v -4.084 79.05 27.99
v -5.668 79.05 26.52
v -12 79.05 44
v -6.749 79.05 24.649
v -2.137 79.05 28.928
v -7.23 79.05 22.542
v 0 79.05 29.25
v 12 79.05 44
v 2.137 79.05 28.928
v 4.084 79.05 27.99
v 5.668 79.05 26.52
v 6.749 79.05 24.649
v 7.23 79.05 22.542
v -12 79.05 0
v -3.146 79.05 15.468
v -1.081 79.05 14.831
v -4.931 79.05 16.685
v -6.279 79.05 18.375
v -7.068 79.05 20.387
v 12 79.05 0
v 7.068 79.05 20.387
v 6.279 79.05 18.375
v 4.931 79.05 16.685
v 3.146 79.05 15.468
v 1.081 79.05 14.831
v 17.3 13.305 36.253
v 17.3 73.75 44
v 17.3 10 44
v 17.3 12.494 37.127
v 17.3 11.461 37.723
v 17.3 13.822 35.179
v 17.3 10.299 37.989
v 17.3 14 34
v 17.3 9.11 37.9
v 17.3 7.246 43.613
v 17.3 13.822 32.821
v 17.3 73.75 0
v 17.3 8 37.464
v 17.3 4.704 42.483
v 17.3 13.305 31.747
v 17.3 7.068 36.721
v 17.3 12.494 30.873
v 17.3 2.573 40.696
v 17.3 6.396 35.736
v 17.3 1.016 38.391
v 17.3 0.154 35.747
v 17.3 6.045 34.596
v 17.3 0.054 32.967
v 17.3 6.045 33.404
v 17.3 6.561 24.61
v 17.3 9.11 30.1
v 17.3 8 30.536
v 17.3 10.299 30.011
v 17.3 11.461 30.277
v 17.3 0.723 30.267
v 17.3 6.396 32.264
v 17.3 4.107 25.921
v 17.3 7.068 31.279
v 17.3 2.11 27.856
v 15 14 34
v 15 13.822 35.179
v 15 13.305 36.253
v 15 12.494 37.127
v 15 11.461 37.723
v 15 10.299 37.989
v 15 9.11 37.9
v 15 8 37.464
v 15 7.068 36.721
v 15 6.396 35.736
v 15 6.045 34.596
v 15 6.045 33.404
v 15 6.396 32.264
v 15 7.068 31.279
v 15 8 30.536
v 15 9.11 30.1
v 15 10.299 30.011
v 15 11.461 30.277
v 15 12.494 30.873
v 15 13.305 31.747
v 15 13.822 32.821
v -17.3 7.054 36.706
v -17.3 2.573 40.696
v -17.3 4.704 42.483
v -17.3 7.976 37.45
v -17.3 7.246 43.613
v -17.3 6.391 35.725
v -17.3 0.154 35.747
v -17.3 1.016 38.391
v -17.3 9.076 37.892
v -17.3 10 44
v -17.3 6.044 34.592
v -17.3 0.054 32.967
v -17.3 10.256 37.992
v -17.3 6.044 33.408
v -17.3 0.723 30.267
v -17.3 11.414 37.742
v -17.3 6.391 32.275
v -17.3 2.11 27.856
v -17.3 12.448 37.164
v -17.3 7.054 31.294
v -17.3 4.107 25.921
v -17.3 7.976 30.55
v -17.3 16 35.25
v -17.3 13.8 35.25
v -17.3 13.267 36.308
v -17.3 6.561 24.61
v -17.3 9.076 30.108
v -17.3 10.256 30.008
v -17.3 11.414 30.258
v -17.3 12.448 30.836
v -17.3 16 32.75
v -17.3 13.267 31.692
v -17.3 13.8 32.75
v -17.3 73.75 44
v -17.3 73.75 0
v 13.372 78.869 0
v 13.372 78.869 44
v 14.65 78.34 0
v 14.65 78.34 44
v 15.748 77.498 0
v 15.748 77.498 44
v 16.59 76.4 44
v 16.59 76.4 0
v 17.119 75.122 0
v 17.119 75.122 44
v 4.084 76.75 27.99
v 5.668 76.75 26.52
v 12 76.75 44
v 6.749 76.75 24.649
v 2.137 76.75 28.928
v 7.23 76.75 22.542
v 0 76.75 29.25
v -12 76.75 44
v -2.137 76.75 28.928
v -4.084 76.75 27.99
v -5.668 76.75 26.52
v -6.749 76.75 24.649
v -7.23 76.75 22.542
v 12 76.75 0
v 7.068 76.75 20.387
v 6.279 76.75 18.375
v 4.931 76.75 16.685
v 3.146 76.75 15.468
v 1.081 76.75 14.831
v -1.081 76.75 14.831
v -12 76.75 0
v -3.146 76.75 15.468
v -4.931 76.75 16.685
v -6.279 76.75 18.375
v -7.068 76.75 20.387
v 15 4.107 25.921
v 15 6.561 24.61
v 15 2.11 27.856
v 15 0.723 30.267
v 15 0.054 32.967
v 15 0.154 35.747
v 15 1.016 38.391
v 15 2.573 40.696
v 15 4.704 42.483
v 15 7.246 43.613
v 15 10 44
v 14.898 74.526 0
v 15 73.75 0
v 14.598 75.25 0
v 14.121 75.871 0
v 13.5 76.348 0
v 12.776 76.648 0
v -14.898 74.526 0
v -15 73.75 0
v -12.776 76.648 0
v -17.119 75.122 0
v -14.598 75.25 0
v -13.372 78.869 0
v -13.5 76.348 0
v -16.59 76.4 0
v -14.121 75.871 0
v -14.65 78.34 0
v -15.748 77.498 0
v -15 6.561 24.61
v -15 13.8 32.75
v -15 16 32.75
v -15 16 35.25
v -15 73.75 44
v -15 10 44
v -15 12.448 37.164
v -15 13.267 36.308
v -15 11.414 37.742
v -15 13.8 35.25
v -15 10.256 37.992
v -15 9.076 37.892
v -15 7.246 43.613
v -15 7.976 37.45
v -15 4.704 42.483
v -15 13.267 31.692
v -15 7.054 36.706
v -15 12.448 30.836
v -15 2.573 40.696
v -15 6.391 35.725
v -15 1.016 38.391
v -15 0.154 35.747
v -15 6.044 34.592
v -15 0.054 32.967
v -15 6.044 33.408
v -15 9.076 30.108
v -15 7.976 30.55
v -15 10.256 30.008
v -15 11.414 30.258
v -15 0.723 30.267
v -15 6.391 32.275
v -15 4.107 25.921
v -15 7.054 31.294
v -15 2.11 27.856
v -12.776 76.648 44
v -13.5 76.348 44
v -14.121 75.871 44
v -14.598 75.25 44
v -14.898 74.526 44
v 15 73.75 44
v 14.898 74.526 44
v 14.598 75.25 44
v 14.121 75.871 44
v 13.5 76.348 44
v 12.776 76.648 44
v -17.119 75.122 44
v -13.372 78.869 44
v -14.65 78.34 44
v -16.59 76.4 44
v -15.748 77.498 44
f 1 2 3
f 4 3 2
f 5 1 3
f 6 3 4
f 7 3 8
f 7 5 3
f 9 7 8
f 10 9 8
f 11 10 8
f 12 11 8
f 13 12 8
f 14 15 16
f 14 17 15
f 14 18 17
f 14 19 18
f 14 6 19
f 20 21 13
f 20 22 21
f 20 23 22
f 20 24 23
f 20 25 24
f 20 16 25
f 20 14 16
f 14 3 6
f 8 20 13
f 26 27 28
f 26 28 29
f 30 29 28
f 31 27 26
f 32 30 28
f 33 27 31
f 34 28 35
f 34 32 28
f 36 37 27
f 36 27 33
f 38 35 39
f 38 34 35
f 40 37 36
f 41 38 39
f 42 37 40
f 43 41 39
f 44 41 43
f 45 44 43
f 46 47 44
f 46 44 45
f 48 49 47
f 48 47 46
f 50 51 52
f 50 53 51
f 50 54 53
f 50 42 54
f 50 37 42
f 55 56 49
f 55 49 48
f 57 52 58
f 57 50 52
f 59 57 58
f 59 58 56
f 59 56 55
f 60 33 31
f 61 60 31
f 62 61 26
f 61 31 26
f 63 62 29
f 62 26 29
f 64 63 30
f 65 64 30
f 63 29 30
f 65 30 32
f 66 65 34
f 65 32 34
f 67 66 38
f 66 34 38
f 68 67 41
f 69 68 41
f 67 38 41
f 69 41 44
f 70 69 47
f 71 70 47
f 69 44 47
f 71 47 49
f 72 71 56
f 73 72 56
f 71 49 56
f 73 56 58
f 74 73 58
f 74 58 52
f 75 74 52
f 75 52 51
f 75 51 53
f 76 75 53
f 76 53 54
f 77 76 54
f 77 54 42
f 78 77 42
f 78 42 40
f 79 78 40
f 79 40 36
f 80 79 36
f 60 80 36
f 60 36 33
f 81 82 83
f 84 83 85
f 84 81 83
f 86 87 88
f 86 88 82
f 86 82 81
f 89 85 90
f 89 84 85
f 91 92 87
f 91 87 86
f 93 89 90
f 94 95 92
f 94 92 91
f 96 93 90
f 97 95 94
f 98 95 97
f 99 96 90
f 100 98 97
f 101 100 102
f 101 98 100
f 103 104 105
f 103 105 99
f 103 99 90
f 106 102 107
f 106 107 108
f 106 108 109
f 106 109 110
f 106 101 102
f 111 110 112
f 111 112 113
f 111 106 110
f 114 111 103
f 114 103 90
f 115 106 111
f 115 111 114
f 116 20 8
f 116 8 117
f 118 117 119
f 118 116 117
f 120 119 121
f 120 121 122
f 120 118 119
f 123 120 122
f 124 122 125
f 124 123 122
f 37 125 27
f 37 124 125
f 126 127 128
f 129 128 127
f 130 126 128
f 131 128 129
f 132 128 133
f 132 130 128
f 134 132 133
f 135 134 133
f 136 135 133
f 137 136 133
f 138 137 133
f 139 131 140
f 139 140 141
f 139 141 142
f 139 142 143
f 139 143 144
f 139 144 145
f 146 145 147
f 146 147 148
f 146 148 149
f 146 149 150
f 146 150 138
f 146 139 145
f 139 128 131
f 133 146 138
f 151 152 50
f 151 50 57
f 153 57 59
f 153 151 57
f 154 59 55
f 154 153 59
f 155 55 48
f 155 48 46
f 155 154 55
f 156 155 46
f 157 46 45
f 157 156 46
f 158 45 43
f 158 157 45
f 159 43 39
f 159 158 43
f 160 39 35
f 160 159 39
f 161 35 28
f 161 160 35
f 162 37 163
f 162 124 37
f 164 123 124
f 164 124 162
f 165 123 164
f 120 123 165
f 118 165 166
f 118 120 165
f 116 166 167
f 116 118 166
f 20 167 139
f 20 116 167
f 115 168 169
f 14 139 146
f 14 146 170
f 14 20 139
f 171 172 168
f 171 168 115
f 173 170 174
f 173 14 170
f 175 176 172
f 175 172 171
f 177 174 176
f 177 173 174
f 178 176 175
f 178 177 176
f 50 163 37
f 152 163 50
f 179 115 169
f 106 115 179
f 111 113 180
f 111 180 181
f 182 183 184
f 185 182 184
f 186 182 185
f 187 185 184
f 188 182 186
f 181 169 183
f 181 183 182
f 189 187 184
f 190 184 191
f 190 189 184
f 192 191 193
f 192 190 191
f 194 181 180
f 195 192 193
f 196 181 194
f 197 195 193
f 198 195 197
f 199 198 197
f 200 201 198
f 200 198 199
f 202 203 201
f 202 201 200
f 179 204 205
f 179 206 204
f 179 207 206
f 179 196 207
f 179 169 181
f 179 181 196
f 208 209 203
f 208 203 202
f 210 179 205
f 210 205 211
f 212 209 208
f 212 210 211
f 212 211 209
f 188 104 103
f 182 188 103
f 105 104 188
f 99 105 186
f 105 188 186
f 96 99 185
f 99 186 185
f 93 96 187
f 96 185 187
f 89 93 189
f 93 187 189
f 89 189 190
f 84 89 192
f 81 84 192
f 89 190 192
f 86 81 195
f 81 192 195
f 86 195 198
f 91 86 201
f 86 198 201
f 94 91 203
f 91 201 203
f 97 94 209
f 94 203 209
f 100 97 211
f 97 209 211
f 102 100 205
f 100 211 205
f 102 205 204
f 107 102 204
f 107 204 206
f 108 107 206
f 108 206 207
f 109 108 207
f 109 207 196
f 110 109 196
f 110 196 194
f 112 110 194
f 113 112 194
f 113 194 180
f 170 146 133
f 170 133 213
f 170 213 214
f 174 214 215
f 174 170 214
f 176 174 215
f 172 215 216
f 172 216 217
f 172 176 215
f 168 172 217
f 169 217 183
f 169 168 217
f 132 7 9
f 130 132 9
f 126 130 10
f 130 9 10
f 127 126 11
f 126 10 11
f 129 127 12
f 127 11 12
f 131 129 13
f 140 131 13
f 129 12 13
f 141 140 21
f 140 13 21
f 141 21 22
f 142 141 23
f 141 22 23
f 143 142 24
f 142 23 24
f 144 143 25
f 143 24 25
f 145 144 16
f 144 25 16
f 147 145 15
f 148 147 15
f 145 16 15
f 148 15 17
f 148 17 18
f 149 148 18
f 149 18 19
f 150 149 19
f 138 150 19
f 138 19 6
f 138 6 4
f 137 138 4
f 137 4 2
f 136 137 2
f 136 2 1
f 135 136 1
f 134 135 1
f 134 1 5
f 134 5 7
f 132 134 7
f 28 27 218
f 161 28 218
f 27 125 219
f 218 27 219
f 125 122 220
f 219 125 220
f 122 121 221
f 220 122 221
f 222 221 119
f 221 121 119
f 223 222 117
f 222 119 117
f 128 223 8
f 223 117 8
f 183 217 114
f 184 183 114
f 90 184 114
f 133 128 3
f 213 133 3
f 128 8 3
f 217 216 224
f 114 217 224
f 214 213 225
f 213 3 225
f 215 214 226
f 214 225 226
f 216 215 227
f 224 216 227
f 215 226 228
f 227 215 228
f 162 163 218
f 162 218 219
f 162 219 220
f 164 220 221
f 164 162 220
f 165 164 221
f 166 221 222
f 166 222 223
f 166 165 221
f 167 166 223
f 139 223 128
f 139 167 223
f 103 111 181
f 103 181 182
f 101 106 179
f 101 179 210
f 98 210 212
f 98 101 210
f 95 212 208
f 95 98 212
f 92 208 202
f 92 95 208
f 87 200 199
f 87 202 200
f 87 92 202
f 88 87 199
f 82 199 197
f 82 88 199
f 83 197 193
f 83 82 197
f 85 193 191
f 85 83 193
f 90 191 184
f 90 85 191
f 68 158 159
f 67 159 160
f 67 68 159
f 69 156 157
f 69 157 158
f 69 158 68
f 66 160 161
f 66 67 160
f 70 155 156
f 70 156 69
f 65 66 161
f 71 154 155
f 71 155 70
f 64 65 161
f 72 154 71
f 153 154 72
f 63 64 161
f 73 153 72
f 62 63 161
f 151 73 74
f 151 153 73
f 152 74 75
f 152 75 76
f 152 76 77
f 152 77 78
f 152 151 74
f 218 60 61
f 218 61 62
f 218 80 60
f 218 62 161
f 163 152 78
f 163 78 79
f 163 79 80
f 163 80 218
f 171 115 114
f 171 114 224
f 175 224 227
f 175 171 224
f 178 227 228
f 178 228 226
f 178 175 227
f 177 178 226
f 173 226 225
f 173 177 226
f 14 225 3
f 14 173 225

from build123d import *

# Parameters (mm, degrees)
BASE_FLANGE1_DEPTH      = 44
CUT_EXTRUDE1_DEPTH      = 57
CUT_EXTRUDE1_DEPTH_BACK = 42
SKETCH7_R               = 4
CUT_EXTRUDE2_DEPTH      = 42
SKETCH8_R               = 7.25
CUT_EXTRUDE3_DEPTH      = 42
SKETCH9_W               = 2.5
SKETCH9_H               = 6
CUT_EXTRUDE4_DEPTH      = 13


# Sheet-metal steps are written as plain solids
with BuildPart() as part:
    # Sketch1 → Base-Flange1 (new body)
    with BuildSketch(Plane.XY):
        with BuildLine():
            Line((15, 0), (15, 73.75))
            ThreePointArc((15, 73.75), (14.121320344, 75.871320344), (12, 76.75))
            Line((12, 76.75), (-12, 76.75))
            ThreePointArc((-12, 76.75), (-14.121320344, 75.871320344), (-15, 73.75))
            Line((-15, 73.75), (-15, 0))
            Line((-15, 0), (-17.3, 0))
            Line((-17.3, 0), (-17.3, 73.75))
            ThreePointArc((-17.3, 73.75), (-15.74766594, 77.49766594), (-12, 79.05))
            Line((-12, 79.05), (12, 79.05))
            ThreePointArc((12, 79.05), (15.74766594, 77.49766594), (17.3, 73.75))
            Line((17.3, 73.75), (17.3, 0))
            Line((17.3, 0), (15, 0))
        make_face()
    extrude(amount=BASE_FLANGE1_DEPTH)

    # Sketch6 → Cut-Extrude1 (cut, two sides: drawn at the far end of the back side and taken through both)
    with BuildSketch(Plane(origin=(0, 0, 0), x_dir=(0, 0, -1), z_dir=(1, 0, 0)).offset(-CUT_EXTRUDE1_DEPTH_BACK)):
        with BuildLine():
            Line((0, 73.75), (-24.610061631, 6.560660321))
            ThreePointArc((-24.610061631, 6.560660321), (-35.746513142, 0.153696539), (-44, 10))
            Line((-44, 10), (-44, 36.875))
            Line((-44, 36.875), (-75.735832134, 36.875))
            Line((-75.735832134, 36.875), (-75.735832134, -15.470238138))
            Line((-75.735832134, -15.470238138), (20.414497878, -15.470238138))
            Line((20.414497878, -15.470238138), (20.414497878, 73.75))
            Line((20.414497878, 73.75), (0, 73.75))
        make_face()
    extrude(amount=CUT_EXTRUDE1_DEPTH + CUT_EXTRUDE1_DEPTH_BACK, mode=Mode.SUBTRACT)

    # Sketch7 → Cut-Extrude2 (cut)
    with BuildSketch(Plane(origin=(17.3, 0, 0), x_dir=(0, 0, -1), z_dir=(1, 0, 0))):
        with Locations(Location((-34, 10, 0), (0, 0, 90))):
            Circle(SKETCH7_R)
    extrude(amount=-CUT_EXTRUDE2_DEPTH, mode=Mode.SUBTRACT)

    # Sketch8 → Cut-Extrude3 (cut)
    with BuildSketch(Plane(origin=(0, 79.05, 0), x_dir=(1, 0, 0), z_dir=(0, 1, 0))):
        with Locations(Location((0, -22, 0), (0, 0, 270))):
            Circle(SKETCH8_R)
    extrude(amount=-CUT_EXTRUDE3_DEPTH, mode=Mode.SUBTRACT)

    # Sketch9 → Cut-Extrude4 (cut)
    with BuildSketch(Plane.ZY.offset(17.3)):
        with Locations((34, 13)):
            Rectangle(SKETCH9_W, SKETCH9_H)
    extrude(amount=-CUT_EXTRUDE4_DEPTH, mode=Mode.SUBTRACT)


solid = part.part
